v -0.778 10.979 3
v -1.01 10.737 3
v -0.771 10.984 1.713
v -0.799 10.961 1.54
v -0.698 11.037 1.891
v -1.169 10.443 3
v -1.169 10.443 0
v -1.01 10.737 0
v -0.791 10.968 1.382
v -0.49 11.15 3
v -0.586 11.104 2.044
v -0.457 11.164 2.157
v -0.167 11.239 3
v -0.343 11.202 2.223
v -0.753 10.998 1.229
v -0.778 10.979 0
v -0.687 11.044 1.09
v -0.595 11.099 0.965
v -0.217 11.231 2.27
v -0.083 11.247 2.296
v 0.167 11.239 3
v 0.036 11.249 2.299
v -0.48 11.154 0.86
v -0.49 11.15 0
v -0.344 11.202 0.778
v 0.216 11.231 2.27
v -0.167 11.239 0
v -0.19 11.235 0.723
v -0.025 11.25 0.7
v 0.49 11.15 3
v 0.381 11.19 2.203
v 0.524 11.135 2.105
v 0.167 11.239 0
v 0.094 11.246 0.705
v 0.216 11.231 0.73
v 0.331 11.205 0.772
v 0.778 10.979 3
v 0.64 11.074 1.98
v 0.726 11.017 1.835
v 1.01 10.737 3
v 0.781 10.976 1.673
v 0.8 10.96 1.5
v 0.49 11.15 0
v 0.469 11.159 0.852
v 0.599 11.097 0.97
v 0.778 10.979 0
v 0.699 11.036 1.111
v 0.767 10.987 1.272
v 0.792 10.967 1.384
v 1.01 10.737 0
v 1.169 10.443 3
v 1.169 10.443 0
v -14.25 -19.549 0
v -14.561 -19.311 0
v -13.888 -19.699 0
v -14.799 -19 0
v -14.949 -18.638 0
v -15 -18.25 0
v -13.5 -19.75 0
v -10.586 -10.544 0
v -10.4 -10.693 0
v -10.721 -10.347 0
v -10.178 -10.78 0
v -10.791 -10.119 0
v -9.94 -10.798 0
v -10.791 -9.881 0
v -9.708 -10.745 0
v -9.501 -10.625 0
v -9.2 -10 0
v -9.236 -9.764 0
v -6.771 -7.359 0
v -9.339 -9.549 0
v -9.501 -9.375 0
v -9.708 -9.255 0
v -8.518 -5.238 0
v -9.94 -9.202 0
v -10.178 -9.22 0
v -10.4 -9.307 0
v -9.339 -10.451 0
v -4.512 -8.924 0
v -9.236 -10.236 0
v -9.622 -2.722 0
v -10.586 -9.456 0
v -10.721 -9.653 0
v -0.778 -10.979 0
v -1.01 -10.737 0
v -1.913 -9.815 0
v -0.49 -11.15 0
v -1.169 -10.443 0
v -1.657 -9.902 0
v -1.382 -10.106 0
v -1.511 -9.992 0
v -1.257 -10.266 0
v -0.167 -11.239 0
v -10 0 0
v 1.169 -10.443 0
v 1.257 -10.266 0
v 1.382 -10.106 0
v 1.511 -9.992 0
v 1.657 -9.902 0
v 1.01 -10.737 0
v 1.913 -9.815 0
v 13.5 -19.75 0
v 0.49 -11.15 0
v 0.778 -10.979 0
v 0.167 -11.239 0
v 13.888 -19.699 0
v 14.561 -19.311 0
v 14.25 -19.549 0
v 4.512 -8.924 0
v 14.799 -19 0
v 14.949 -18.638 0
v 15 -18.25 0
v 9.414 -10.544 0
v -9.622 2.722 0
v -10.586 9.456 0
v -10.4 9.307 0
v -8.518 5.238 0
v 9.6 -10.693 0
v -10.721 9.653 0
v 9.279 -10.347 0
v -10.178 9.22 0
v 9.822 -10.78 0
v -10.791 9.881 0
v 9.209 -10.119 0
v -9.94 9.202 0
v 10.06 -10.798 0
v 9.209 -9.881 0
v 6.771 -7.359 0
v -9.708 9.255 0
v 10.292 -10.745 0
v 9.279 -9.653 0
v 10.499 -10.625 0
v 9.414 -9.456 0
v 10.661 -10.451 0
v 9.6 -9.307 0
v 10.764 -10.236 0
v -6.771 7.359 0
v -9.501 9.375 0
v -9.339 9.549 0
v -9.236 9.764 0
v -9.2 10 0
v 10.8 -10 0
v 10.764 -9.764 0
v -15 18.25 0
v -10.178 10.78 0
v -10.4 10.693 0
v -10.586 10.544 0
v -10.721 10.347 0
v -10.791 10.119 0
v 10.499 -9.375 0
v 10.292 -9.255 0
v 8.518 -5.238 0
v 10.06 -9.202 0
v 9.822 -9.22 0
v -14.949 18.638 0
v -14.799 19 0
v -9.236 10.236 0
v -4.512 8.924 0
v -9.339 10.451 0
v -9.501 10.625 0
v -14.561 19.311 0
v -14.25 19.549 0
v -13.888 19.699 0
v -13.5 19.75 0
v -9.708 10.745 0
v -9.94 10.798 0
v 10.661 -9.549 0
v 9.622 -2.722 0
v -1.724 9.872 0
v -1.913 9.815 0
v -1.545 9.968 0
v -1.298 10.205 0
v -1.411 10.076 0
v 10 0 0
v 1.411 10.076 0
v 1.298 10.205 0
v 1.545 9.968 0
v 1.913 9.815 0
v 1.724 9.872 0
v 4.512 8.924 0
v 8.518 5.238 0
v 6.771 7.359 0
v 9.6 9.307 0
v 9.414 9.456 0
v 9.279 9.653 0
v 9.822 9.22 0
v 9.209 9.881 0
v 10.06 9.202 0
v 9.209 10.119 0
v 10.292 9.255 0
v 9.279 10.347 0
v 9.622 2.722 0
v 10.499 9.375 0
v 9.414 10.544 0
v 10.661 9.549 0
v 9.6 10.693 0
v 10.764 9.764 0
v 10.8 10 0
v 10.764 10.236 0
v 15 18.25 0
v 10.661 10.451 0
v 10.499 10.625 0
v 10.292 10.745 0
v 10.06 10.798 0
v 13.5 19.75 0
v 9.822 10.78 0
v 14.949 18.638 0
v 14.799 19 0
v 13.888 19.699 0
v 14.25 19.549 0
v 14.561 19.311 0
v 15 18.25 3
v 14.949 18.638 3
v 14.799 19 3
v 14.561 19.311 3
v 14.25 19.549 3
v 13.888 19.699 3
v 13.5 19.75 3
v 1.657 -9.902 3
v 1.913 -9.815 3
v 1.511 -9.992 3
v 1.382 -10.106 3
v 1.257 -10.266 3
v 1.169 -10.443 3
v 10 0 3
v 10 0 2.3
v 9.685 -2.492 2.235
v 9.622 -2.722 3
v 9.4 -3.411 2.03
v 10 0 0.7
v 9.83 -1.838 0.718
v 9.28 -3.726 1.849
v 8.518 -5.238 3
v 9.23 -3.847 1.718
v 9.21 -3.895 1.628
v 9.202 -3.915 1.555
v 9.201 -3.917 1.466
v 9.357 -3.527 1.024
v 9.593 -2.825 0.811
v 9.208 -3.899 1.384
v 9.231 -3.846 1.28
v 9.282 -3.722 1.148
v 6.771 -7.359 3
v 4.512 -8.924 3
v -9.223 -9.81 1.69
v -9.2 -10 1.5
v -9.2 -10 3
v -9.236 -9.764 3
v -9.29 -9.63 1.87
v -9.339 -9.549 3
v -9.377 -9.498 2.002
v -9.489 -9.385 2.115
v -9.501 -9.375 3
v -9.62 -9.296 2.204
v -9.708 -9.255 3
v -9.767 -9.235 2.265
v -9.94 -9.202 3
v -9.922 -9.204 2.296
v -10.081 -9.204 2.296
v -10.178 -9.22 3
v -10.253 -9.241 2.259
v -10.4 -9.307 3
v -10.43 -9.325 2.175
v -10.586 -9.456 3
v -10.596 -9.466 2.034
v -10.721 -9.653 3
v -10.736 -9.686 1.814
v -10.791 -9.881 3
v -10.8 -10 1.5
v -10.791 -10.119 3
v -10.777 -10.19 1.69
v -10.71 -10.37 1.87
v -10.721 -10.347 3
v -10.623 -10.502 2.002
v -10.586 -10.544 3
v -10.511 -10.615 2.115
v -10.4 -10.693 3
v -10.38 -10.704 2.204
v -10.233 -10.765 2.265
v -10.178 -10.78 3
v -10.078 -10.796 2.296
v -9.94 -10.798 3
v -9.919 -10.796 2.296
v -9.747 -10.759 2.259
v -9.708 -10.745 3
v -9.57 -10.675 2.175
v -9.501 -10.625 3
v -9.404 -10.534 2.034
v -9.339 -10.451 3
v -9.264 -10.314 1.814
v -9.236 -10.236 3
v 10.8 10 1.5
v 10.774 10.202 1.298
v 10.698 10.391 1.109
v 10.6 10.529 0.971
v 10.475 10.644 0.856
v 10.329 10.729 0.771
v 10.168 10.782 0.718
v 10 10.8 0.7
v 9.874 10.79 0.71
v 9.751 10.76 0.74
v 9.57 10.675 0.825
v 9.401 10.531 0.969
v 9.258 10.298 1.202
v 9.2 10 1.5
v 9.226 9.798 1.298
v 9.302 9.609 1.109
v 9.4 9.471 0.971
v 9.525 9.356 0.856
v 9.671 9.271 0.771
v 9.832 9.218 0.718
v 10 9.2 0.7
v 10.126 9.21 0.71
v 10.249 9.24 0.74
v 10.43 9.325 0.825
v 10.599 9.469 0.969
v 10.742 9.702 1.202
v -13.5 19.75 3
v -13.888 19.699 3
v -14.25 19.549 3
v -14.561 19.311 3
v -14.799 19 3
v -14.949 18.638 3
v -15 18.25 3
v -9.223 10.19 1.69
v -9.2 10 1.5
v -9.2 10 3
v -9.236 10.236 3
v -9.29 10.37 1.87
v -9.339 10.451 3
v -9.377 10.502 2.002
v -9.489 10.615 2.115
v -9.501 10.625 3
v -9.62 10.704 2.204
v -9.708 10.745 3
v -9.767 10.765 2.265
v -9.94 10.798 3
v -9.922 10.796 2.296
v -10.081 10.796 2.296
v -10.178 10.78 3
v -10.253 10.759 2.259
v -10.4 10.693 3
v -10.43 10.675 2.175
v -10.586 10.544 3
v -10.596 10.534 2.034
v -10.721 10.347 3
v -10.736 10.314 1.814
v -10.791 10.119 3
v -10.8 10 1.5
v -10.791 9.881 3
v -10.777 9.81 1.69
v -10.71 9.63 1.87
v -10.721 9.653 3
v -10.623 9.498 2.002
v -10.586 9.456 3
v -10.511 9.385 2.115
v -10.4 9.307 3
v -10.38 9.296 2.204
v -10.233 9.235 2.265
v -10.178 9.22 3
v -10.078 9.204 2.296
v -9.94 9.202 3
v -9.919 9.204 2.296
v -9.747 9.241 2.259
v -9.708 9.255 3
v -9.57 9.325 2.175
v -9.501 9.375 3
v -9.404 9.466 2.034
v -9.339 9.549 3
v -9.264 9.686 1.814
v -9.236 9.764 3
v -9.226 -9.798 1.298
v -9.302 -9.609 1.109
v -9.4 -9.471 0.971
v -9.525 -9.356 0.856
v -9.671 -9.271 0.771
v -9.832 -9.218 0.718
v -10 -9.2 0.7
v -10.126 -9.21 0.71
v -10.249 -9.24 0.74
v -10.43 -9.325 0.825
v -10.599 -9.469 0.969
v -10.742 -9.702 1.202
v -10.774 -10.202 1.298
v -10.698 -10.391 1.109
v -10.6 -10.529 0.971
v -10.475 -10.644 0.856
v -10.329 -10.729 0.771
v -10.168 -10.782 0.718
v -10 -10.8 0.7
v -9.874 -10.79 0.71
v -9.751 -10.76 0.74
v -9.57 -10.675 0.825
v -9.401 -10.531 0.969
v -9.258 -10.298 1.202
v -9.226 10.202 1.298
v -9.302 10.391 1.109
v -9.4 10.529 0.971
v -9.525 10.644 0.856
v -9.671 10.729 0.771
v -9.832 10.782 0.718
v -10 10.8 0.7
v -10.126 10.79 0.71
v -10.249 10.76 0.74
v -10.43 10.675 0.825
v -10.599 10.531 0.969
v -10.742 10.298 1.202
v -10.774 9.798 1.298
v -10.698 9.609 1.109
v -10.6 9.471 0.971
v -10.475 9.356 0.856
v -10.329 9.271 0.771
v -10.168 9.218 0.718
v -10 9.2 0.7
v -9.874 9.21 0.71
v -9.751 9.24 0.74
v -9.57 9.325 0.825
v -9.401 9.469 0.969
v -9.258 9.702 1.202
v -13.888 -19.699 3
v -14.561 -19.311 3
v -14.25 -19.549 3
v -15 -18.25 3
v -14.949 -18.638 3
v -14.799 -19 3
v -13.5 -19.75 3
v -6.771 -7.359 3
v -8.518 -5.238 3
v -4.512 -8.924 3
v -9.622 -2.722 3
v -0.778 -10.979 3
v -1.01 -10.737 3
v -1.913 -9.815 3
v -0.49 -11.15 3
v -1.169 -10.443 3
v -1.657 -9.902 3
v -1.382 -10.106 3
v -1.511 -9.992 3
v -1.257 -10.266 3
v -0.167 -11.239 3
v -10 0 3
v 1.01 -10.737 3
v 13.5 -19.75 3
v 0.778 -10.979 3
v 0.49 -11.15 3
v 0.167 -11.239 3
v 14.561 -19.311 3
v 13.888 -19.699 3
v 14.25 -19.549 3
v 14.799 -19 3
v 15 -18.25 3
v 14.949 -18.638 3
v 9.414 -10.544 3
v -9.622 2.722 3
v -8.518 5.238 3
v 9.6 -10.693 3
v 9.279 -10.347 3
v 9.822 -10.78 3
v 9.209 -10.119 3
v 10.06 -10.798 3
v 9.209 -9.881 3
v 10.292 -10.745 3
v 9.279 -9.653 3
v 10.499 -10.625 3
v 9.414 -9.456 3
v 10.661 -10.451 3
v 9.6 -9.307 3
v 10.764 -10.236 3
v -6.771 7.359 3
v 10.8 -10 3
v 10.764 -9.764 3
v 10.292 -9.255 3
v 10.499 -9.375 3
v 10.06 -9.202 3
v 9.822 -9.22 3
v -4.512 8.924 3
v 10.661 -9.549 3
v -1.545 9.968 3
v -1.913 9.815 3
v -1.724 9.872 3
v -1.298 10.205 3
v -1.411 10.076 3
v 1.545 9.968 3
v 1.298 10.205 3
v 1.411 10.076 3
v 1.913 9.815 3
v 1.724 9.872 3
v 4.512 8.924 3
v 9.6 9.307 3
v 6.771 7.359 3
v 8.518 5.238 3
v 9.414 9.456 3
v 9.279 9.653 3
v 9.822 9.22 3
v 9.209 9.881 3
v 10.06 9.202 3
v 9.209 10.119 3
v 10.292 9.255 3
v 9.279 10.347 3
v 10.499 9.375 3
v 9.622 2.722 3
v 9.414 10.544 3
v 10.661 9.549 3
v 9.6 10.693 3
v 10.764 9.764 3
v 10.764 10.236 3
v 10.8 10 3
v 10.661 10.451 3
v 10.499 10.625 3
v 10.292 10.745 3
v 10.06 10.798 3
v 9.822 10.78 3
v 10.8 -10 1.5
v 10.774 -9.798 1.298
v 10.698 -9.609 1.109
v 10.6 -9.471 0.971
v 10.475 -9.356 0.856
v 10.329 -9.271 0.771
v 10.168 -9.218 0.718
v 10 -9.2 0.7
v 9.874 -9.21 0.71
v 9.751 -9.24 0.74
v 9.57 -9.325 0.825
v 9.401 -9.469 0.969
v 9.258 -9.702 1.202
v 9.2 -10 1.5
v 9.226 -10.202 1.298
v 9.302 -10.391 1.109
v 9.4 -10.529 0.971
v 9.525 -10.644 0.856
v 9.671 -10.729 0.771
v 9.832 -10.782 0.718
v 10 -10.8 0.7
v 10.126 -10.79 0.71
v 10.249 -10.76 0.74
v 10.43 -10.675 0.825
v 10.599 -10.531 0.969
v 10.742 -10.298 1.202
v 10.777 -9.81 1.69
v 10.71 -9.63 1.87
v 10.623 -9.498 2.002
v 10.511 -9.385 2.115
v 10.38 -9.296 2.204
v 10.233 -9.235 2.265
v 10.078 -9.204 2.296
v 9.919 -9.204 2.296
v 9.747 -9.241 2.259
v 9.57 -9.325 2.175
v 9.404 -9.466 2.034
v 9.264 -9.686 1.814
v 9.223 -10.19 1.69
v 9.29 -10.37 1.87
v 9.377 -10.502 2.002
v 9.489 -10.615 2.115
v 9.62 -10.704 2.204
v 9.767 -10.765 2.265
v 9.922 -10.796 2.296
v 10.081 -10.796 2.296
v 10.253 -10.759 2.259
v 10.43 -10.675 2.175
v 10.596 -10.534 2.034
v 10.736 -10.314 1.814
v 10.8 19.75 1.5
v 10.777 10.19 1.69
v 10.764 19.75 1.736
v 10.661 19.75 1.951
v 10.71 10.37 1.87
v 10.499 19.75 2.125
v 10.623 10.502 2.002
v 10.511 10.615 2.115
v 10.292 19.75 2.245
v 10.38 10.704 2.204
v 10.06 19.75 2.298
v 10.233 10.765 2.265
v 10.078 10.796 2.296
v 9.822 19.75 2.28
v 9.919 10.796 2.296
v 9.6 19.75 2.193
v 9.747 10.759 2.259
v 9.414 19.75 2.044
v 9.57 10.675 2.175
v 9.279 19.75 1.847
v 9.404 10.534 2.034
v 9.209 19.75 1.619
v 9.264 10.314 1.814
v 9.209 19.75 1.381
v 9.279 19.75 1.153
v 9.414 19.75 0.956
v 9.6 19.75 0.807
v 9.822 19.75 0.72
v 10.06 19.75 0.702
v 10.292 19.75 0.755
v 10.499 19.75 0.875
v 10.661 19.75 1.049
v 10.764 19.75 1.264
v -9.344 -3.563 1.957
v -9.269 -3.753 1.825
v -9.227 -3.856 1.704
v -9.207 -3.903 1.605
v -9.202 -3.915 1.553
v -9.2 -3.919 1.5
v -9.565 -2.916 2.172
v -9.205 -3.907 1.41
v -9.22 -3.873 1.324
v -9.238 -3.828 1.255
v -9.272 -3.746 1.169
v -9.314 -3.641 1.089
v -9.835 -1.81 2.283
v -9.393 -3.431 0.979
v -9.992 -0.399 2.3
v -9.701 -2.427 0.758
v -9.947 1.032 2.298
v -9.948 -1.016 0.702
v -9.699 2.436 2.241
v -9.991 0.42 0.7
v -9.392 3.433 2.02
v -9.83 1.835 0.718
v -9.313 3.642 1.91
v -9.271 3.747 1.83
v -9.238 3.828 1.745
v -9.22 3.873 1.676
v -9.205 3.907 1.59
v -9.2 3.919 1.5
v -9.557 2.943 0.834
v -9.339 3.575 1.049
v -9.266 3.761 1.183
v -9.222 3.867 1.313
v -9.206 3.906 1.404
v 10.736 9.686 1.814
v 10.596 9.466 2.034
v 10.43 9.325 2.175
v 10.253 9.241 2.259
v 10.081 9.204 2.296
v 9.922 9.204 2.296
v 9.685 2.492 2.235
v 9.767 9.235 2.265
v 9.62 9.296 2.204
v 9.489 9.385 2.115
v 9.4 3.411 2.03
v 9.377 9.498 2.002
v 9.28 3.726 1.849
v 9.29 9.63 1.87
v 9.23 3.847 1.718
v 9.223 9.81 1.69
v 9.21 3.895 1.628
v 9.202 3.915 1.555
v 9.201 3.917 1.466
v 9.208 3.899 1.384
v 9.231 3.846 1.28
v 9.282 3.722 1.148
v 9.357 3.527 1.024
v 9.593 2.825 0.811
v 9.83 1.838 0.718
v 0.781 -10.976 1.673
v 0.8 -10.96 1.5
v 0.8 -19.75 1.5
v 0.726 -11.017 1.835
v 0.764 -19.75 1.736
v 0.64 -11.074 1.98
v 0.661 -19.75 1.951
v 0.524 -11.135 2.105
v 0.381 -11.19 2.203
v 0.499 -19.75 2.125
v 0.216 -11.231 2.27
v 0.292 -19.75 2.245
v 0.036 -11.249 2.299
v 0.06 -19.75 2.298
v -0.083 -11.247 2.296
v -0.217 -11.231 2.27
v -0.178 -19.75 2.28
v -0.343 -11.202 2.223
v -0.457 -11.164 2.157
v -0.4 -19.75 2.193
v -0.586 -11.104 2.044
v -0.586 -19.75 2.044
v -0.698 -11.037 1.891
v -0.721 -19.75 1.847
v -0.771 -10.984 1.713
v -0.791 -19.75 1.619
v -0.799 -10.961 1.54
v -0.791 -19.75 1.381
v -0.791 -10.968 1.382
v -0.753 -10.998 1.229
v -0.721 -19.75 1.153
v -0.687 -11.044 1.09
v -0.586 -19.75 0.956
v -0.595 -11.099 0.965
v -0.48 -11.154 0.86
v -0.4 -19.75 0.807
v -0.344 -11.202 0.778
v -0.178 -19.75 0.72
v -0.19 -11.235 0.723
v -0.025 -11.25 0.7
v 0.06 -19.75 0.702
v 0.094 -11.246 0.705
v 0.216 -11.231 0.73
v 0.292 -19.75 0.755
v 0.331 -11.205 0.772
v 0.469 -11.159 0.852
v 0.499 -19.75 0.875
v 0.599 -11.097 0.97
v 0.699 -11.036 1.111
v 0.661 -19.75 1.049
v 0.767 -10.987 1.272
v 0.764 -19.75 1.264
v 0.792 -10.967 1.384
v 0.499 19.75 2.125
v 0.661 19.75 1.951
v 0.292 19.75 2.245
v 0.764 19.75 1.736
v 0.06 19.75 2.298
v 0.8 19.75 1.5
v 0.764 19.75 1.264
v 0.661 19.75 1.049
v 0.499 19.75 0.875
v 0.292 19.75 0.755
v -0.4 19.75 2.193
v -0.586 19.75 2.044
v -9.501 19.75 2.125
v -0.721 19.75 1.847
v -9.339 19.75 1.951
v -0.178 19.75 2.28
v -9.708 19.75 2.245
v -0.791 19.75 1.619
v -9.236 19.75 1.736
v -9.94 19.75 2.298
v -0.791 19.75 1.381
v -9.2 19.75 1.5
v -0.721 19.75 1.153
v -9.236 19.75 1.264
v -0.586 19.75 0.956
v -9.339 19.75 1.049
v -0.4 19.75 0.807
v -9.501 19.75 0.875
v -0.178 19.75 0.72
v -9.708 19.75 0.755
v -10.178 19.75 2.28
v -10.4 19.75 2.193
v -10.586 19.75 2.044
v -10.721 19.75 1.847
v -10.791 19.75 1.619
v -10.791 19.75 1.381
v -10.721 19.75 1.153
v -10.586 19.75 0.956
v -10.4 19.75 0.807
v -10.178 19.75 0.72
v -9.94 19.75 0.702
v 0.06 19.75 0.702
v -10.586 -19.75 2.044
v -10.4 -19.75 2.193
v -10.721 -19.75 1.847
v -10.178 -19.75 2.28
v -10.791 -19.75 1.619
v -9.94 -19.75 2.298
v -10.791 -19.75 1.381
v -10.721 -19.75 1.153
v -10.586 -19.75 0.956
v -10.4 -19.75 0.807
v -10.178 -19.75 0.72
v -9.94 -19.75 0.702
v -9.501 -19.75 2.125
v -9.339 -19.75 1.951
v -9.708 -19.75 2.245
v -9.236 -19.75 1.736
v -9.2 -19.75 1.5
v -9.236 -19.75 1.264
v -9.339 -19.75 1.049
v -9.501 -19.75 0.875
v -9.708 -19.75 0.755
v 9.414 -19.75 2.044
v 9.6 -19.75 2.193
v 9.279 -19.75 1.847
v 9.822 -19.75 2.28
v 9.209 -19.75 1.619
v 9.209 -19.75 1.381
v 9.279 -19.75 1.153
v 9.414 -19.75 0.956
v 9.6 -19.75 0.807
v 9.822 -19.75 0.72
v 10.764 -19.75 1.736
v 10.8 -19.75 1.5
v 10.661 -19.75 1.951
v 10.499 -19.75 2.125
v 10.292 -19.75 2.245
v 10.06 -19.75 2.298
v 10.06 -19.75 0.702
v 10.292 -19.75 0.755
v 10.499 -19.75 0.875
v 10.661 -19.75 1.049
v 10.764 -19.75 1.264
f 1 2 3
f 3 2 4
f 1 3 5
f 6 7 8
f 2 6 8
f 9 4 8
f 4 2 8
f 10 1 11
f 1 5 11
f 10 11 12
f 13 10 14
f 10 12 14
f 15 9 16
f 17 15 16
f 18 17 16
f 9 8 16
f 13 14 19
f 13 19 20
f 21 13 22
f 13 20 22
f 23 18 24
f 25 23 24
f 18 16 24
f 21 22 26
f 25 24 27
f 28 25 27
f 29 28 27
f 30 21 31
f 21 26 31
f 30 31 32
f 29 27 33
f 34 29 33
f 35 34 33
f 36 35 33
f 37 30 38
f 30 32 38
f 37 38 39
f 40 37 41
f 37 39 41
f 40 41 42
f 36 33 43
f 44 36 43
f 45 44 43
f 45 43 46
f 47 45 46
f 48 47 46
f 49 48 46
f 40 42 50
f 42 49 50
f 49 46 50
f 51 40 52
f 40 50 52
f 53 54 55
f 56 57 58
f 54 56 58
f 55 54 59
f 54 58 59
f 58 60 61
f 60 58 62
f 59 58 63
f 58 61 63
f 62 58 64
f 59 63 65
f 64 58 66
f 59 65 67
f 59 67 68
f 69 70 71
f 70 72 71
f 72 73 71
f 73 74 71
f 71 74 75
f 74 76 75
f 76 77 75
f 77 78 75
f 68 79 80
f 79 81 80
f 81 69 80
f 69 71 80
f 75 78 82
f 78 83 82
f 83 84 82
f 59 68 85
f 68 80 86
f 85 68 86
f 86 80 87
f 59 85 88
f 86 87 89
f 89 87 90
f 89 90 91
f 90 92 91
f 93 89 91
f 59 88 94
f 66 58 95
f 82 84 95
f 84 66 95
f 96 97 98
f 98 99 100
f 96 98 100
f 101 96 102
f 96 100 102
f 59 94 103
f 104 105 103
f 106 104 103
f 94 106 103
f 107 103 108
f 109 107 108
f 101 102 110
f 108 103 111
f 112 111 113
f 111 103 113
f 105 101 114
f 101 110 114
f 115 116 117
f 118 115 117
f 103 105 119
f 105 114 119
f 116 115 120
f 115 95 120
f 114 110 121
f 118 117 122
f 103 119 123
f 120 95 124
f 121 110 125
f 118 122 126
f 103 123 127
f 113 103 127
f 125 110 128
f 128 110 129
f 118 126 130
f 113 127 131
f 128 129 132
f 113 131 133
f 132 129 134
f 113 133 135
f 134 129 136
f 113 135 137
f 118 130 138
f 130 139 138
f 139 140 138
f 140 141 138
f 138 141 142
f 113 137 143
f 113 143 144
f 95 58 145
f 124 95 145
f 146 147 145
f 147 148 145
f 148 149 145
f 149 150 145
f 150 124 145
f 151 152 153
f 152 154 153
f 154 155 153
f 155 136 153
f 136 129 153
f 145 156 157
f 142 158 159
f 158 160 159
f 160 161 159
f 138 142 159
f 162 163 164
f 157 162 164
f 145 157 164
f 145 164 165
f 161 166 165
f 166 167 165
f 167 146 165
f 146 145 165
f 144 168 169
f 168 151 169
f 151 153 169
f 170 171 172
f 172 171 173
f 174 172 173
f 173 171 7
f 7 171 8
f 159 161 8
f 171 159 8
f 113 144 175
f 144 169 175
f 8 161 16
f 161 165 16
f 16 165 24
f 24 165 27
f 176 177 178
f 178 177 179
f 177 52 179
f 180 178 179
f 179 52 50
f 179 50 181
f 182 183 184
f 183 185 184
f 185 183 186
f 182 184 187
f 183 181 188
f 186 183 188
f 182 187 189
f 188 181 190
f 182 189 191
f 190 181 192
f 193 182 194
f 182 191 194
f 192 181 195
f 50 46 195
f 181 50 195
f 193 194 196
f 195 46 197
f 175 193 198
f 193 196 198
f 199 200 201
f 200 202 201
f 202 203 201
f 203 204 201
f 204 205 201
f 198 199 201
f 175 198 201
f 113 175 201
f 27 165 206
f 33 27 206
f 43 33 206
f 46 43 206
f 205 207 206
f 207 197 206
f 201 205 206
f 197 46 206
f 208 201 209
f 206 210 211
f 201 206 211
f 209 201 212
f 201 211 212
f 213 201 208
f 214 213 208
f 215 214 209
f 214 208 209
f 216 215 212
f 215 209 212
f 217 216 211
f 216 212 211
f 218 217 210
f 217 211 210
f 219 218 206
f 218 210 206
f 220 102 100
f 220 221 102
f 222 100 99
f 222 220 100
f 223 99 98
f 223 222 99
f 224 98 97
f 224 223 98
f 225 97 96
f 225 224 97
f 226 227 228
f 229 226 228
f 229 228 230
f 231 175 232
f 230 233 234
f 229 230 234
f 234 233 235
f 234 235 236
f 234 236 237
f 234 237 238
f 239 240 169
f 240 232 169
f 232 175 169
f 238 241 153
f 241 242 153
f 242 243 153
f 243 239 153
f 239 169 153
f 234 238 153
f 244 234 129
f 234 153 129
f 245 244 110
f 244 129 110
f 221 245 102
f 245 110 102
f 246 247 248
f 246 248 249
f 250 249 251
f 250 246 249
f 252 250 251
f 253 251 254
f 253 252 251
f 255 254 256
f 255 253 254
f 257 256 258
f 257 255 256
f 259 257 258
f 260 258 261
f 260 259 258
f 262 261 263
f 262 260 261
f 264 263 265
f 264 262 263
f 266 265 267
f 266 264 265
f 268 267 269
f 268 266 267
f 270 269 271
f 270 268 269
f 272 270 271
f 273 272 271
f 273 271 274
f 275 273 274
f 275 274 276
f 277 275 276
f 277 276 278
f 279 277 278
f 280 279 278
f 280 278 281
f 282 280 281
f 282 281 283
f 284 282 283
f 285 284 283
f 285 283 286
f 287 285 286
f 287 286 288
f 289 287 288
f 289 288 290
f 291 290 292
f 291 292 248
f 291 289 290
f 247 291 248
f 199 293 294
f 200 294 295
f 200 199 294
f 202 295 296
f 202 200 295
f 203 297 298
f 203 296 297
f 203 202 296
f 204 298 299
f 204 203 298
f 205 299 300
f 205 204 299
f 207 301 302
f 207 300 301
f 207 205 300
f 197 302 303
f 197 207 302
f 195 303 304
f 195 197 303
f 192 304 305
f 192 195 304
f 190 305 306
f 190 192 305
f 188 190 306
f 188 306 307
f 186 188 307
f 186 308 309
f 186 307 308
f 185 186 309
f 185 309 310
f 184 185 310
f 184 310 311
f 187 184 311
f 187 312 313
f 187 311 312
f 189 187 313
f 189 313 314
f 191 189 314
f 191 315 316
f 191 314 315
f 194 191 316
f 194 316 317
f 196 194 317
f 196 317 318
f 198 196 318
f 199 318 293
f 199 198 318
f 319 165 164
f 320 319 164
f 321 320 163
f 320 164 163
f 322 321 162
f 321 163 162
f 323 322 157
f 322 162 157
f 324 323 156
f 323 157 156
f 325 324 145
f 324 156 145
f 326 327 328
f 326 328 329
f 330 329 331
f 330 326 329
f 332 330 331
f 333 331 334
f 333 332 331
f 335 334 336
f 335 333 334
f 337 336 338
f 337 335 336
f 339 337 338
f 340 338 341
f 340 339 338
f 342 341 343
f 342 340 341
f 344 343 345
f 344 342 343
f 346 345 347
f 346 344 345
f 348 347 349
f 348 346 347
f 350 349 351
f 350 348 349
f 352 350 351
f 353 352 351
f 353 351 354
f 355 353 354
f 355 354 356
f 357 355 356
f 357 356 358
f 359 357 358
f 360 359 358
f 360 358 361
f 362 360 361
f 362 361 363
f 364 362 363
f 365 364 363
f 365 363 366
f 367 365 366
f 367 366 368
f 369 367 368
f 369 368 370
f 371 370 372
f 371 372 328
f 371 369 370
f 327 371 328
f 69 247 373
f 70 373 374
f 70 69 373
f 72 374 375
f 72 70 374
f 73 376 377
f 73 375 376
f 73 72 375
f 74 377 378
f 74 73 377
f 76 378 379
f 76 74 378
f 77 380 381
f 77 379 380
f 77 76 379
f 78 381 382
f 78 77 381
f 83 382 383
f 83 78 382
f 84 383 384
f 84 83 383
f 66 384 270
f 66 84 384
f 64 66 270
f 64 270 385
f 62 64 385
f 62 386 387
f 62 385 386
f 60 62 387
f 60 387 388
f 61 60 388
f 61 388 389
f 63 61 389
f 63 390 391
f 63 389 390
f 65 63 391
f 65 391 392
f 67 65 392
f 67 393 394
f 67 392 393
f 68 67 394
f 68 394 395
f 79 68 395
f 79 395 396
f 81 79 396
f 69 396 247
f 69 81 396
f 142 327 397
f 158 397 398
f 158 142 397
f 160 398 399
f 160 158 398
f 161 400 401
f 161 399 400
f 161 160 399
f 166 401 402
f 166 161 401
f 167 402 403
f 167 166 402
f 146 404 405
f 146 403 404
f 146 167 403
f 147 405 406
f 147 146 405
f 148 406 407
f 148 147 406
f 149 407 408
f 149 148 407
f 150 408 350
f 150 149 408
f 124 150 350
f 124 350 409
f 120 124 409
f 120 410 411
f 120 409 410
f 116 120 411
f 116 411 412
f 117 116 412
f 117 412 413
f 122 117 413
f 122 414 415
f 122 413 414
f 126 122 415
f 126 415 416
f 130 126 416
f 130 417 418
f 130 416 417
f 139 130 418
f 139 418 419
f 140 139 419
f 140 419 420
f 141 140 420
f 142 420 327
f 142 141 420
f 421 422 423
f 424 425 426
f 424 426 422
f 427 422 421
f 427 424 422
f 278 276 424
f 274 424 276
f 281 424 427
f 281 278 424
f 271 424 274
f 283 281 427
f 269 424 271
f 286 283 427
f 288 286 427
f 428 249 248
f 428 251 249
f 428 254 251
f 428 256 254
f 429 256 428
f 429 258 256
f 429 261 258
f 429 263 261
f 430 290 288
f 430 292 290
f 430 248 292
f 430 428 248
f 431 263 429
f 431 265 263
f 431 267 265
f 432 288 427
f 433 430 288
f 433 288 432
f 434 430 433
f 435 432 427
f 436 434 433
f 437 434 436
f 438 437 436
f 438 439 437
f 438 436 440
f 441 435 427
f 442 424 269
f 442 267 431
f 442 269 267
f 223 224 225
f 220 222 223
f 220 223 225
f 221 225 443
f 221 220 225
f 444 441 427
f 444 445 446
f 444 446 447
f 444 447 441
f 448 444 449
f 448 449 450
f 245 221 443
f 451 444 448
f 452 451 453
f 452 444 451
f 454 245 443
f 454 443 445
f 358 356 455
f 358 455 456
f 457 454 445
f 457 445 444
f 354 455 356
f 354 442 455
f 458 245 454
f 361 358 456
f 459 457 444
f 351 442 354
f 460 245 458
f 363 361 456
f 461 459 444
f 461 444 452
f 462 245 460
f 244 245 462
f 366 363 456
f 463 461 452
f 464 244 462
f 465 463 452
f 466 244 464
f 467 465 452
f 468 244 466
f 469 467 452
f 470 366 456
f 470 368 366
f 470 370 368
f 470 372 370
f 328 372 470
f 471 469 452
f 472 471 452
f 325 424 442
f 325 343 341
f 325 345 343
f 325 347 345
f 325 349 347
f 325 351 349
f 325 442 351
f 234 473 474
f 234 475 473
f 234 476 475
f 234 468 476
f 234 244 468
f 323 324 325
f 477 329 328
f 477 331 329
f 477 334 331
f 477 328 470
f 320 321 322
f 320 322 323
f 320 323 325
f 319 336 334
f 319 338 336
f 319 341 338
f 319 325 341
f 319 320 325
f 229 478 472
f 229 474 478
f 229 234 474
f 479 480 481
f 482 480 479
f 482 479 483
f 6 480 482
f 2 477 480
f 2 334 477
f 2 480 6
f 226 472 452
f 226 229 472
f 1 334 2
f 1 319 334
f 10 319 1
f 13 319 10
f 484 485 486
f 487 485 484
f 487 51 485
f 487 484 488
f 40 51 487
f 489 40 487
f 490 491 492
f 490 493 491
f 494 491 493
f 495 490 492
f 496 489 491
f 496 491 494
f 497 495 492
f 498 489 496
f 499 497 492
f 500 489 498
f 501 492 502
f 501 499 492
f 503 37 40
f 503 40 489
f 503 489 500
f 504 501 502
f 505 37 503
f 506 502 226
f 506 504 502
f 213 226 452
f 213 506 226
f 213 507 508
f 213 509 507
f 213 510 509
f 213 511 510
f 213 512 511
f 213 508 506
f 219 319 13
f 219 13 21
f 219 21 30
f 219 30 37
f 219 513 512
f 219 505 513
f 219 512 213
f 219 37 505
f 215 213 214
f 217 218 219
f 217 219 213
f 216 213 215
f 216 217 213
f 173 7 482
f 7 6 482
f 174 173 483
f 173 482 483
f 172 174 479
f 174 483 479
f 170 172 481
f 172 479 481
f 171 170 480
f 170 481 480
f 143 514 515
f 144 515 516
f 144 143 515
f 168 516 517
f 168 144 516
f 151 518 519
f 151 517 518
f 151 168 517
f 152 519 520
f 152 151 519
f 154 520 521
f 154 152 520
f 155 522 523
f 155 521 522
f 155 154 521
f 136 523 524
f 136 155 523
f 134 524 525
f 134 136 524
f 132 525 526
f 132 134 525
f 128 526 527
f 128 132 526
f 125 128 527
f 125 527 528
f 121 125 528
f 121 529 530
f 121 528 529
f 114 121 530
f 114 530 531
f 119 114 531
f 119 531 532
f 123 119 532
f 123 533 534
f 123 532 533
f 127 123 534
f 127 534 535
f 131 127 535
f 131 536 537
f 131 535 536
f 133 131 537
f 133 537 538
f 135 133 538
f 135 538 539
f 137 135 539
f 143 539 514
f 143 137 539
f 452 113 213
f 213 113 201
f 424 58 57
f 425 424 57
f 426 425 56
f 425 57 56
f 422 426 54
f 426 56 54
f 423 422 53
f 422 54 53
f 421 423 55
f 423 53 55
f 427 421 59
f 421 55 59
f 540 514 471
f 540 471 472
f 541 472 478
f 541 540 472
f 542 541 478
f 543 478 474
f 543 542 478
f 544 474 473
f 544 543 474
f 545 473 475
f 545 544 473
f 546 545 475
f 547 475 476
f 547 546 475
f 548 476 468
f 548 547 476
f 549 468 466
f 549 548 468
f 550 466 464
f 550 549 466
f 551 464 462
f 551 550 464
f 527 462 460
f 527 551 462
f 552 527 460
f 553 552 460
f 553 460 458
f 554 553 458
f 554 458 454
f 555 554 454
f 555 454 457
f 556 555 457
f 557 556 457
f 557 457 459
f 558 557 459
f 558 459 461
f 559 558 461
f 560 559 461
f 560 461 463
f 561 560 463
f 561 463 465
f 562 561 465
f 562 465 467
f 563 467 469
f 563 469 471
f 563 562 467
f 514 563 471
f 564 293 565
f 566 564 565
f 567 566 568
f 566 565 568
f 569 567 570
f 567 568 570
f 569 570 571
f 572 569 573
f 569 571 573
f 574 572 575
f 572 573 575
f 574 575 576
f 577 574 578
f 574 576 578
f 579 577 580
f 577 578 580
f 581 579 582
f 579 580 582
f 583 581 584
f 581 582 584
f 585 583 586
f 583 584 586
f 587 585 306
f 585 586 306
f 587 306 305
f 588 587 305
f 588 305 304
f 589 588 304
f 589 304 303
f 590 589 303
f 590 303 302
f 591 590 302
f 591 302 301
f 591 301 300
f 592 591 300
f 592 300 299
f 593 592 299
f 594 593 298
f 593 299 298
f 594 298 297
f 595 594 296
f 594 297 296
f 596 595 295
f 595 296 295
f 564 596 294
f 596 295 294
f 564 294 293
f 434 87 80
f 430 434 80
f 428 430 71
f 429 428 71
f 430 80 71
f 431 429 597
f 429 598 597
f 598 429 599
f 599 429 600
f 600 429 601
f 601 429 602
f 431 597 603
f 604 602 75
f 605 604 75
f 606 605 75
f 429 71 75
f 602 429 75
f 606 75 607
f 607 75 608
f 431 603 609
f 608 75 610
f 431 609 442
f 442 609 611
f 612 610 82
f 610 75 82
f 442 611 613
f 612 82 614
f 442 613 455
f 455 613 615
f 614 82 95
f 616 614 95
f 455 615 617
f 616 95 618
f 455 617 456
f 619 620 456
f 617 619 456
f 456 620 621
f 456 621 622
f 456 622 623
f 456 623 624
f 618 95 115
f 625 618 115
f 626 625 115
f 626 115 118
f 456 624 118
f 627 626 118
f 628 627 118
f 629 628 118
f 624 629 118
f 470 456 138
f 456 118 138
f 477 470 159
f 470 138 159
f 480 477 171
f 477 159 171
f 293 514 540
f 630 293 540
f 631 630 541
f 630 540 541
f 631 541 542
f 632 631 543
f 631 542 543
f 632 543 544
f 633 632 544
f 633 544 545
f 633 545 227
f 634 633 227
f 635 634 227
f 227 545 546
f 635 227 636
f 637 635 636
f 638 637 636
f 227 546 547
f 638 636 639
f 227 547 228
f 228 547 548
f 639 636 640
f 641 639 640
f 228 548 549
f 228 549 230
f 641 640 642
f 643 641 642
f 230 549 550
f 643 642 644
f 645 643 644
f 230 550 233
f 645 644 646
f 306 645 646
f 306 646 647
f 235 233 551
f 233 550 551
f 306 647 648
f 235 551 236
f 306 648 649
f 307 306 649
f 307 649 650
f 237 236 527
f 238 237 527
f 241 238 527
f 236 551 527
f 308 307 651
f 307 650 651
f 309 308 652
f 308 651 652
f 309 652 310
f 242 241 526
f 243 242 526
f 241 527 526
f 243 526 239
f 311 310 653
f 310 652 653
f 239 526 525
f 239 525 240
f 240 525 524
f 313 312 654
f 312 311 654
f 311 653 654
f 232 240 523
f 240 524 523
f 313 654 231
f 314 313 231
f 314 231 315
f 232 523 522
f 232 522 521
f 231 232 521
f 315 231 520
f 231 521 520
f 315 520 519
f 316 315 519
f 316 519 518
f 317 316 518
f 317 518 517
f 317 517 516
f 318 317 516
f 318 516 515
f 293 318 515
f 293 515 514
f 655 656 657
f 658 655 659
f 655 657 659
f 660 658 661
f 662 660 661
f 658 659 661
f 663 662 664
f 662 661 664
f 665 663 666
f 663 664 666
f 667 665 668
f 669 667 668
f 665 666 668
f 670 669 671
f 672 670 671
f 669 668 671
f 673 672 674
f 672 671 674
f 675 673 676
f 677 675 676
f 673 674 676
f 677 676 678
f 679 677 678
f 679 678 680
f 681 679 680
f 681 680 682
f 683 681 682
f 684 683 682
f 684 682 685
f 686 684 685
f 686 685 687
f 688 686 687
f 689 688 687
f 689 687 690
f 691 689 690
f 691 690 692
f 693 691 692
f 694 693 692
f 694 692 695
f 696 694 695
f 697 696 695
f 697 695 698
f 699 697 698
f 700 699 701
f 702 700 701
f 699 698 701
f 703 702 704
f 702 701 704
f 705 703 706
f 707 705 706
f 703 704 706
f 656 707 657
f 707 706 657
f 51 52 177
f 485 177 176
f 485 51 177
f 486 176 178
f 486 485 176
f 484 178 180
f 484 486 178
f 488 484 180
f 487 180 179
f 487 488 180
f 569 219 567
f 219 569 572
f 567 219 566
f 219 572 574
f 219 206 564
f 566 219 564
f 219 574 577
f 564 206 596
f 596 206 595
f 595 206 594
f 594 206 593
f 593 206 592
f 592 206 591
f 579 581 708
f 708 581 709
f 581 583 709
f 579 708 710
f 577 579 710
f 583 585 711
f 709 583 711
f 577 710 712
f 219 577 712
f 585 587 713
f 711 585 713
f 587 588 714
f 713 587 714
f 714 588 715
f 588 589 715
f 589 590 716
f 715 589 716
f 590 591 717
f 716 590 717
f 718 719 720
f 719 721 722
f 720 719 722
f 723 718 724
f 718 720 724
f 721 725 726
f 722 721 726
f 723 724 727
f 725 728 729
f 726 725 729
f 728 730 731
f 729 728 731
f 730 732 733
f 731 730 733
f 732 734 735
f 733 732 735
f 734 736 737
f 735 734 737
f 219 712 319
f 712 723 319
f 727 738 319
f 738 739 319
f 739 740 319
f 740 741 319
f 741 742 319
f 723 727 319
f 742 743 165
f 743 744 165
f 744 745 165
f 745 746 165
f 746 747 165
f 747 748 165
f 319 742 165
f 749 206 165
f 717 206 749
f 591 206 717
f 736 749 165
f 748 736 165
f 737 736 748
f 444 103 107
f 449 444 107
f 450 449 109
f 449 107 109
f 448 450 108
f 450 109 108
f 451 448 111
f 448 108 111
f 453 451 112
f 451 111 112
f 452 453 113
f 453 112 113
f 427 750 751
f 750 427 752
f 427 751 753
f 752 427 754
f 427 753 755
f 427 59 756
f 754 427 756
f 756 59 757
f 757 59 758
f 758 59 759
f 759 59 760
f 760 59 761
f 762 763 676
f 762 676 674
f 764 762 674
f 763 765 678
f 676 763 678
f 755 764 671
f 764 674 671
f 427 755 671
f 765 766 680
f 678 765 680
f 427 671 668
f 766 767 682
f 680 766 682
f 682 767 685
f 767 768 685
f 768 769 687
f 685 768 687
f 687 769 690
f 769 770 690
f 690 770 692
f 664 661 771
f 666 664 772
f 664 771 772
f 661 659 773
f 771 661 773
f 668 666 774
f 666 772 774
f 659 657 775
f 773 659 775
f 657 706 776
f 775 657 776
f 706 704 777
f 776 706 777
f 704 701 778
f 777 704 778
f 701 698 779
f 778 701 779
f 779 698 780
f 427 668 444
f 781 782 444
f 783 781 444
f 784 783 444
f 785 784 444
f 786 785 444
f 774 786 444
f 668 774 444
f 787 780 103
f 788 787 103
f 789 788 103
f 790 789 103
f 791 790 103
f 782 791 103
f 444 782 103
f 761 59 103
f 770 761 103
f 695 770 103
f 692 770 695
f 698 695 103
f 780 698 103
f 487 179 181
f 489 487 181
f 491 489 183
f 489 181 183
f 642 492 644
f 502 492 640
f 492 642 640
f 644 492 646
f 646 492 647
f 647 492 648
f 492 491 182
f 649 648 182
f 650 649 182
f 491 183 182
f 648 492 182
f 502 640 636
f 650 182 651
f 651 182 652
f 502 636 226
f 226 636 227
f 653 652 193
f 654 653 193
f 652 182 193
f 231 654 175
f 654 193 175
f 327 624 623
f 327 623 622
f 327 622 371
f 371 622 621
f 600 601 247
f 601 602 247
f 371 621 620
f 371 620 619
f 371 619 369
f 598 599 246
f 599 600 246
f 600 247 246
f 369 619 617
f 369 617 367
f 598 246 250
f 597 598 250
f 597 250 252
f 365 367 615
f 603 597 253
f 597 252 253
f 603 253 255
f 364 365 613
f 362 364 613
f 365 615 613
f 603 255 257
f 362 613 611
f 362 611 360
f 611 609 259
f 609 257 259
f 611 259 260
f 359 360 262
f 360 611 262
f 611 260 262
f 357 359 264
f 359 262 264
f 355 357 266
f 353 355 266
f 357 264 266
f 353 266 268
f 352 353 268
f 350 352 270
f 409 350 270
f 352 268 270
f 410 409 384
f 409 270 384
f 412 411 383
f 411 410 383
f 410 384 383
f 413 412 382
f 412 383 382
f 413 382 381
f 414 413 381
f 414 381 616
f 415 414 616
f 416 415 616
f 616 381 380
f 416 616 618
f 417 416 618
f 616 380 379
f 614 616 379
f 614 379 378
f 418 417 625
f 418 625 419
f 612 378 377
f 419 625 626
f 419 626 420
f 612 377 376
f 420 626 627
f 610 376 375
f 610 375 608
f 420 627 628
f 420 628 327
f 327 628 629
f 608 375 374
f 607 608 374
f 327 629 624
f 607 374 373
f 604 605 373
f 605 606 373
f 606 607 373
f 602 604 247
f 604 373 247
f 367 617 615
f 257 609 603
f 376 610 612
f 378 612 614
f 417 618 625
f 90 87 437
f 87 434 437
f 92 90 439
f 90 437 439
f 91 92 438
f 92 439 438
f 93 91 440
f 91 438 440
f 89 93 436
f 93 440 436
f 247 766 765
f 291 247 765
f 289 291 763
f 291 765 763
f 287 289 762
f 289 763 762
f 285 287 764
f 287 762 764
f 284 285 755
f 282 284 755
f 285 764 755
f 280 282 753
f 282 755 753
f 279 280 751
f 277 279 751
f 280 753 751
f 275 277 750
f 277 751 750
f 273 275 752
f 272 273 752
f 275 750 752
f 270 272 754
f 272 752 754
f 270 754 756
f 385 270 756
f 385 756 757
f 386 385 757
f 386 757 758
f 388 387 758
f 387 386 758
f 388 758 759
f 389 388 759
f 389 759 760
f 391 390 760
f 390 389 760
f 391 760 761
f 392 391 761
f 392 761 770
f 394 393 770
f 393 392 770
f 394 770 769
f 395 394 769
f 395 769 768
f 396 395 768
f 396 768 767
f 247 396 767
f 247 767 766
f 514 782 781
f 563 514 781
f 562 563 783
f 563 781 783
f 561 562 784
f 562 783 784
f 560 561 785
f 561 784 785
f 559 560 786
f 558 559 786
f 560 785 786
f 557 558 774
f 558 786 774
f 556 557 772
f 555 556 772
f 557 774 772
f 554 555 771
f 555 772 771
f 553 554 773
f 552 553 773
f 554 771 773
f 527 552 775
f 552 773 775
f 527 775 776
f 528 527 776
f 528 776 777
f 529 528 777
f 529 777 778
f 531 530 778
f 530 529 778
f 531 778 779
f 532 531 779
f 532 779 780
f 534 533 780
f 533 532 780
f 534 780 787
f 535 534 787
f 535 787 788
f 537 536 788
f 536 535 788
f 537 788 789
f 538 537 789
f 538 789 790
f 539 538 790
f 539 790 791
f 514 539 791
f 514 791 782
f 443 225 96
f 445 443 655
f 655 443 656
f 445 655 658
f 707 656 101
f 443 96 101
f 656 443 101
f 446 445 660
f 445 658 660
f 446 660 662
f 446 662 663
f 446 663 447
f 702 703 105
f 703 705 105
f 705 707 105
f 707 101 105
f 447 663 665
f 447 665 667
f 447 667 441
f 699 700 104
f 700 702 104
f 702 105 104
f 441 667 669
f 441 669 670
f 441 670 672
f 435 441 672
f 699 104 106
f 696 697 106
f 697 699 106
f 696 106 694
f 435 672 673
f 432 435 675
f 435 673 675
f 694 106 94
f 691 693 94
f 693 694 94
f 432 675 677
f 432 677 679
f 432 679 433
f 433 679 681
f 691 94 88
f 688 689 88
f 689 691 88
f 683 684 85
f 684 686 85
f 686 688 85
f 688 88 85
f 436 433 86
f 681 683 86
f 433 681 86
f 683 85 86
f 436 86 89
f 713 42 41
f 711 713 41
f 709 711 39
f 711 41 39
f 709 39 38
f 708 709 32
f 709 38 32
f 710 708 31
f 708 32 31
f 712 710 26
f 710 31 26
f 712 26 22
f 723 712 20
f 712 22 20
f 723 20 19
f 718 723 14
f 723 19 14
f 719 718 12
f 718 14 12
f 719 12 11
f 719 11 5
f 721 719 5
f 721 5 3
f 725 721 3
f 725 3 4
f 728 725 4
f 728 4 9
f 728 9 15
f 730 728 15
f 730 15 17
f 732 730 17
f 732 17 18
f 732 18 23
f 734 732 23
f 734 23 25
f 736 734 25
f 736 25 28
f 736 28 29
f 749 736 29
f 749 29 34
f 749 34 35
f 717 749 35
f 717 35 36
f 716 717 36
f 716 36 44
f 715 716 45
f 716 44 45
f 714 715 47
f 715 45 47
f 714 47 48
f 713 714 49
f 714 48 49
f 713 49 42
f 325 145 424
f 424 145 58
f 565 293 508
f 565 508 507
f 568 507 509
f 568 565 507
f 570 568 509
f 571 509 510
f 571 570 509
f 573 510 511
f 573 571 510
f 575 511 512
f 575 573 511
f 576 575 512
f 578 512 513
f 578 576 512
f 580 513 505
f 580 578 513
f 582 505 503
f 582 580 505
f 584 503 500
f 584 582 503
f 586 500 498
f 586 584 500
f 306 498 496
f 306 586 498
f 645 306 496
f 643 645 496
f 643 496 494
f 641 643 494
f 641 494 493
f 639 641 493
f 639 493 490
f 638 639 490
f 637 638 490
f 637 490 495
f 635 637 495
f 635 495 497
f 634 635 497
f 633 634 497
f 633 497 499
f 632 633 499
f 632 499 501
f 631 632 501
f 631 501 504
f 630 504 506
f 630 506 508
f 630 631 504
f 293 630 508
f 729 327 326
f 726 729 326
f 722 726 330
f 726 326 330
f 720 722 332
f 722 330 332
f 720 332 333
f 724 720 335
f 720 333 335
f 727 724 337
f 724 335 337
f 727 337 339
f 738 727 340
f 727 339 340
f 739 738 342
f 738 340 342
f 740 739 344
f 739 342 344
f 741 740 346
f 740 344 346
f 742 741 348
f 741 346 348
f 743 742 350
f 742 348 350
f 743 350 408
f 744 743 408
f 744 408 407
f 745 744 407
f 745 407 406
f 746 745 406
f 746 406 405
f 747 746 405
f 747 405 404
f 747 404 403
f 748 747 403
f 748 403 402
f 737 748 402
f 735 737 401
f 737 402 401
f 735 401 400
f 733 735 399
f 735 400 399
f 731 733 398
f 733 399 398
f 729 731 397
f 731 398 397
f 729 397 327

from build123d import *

# Parameters (mm, degrees)
F0_R     = 0.8
F1_DEPTH = 3
F2_R     = 0.8
F3_DEPTH = 39.501
F4_R     = 1


with BuildPart() as f1:
    # F0 (on Top) → F1 (new body)
    with BuildSketch(Plane.XY):
        with BuildLine():
            Line((13.5, 19.75), (-13.5, 19.75))
            ThreePointArc((-13.5, 19.75), (-14.56066, 19.31066), (-15, 18.25))
            Line((-15, 18.25), (-15, -18.25))
            ThreePointArc((-15, -18.25), (-14.56066, -19.31066), (-13.5, -19.75))
            Line((-13.5, -19.75), (13.5, -19.75))
            ThreePointArc((13.5, -19.75), (14.56066, -19.31066), (15, -18.25))
            Line((15, -18.25), (15, 18.25))
            ThreePointArc((15, 18.25), (14.56066, 19.31066), (13.5, 19.75))
        make_face()
        with Locations((-10, -10)):
            Circle(F0_R, mode=Mode.SUBTRACT)
        with Locations((10, -10)):
            Circle(F0_R, mode=Mode.SUBTRACT)
        with Locations((-10, 10)):
            Circle(F0_R, mode=Mode.SUBTRACT)
        with BuildLine():
            ThreePointArc((1.25, 9.921567), (7.5, 6.614378), (10, 0))
            ThreePointArc((10, 0), (7.5, -6.614378), (1.25, -9.921567))
            Line((1.25, -9.921567), (1.25, -10))
            ThreePointArc((1.25, -10), (0, -11.25), (-1.25, -10))
            Line((-1.25, -10), (-1.25, -9.921567))
            ThreePointArc((-1.25, -9.921567), (-10, 0), (-1.25, 9.921567))
            Line((-1.25, 9.921567), (-1.25, 10))
            ThreePointArc((-1.25, 10), (0, 11.25), (1.25, 10))
            Line((1.25, 10), (1.25, 9.921567))
        make_face(mode=Mode.SUBTRACT)
        with Locations((10, 10)):
            Circle(F0_R, mode=Mode.SUBTRACT)
    extrude(amount=F1_DEPTH)

    # F2 (on face) → F3 (cut, through all)
    with BuildSketch(Plane.XZ.offset(19.75)):
        with Locations((0, 1.5)):
            Circle(F2_R)
        with Locations((10, 1.5)):
            Circle(F2_R)
        with Locations((-10, 1.5)):
            Circle(F2_R)
    extrude(amount=-F3_DEPTH, mode=Mode.SUBTRACT)

    # F4
    f4_edges = [f1.edges().sort_by_distance(p)[0] for p in [
        (1.25, 9.921567, 1.5),
        (-1.25, 9.921567, 1.5),
        (-1.25, -9.921567, 1.5),
        (1.25, -9.921567, 1.5),
    ]]
    fillet(f4_edges, radius=F4_R)


solid = f1.part
